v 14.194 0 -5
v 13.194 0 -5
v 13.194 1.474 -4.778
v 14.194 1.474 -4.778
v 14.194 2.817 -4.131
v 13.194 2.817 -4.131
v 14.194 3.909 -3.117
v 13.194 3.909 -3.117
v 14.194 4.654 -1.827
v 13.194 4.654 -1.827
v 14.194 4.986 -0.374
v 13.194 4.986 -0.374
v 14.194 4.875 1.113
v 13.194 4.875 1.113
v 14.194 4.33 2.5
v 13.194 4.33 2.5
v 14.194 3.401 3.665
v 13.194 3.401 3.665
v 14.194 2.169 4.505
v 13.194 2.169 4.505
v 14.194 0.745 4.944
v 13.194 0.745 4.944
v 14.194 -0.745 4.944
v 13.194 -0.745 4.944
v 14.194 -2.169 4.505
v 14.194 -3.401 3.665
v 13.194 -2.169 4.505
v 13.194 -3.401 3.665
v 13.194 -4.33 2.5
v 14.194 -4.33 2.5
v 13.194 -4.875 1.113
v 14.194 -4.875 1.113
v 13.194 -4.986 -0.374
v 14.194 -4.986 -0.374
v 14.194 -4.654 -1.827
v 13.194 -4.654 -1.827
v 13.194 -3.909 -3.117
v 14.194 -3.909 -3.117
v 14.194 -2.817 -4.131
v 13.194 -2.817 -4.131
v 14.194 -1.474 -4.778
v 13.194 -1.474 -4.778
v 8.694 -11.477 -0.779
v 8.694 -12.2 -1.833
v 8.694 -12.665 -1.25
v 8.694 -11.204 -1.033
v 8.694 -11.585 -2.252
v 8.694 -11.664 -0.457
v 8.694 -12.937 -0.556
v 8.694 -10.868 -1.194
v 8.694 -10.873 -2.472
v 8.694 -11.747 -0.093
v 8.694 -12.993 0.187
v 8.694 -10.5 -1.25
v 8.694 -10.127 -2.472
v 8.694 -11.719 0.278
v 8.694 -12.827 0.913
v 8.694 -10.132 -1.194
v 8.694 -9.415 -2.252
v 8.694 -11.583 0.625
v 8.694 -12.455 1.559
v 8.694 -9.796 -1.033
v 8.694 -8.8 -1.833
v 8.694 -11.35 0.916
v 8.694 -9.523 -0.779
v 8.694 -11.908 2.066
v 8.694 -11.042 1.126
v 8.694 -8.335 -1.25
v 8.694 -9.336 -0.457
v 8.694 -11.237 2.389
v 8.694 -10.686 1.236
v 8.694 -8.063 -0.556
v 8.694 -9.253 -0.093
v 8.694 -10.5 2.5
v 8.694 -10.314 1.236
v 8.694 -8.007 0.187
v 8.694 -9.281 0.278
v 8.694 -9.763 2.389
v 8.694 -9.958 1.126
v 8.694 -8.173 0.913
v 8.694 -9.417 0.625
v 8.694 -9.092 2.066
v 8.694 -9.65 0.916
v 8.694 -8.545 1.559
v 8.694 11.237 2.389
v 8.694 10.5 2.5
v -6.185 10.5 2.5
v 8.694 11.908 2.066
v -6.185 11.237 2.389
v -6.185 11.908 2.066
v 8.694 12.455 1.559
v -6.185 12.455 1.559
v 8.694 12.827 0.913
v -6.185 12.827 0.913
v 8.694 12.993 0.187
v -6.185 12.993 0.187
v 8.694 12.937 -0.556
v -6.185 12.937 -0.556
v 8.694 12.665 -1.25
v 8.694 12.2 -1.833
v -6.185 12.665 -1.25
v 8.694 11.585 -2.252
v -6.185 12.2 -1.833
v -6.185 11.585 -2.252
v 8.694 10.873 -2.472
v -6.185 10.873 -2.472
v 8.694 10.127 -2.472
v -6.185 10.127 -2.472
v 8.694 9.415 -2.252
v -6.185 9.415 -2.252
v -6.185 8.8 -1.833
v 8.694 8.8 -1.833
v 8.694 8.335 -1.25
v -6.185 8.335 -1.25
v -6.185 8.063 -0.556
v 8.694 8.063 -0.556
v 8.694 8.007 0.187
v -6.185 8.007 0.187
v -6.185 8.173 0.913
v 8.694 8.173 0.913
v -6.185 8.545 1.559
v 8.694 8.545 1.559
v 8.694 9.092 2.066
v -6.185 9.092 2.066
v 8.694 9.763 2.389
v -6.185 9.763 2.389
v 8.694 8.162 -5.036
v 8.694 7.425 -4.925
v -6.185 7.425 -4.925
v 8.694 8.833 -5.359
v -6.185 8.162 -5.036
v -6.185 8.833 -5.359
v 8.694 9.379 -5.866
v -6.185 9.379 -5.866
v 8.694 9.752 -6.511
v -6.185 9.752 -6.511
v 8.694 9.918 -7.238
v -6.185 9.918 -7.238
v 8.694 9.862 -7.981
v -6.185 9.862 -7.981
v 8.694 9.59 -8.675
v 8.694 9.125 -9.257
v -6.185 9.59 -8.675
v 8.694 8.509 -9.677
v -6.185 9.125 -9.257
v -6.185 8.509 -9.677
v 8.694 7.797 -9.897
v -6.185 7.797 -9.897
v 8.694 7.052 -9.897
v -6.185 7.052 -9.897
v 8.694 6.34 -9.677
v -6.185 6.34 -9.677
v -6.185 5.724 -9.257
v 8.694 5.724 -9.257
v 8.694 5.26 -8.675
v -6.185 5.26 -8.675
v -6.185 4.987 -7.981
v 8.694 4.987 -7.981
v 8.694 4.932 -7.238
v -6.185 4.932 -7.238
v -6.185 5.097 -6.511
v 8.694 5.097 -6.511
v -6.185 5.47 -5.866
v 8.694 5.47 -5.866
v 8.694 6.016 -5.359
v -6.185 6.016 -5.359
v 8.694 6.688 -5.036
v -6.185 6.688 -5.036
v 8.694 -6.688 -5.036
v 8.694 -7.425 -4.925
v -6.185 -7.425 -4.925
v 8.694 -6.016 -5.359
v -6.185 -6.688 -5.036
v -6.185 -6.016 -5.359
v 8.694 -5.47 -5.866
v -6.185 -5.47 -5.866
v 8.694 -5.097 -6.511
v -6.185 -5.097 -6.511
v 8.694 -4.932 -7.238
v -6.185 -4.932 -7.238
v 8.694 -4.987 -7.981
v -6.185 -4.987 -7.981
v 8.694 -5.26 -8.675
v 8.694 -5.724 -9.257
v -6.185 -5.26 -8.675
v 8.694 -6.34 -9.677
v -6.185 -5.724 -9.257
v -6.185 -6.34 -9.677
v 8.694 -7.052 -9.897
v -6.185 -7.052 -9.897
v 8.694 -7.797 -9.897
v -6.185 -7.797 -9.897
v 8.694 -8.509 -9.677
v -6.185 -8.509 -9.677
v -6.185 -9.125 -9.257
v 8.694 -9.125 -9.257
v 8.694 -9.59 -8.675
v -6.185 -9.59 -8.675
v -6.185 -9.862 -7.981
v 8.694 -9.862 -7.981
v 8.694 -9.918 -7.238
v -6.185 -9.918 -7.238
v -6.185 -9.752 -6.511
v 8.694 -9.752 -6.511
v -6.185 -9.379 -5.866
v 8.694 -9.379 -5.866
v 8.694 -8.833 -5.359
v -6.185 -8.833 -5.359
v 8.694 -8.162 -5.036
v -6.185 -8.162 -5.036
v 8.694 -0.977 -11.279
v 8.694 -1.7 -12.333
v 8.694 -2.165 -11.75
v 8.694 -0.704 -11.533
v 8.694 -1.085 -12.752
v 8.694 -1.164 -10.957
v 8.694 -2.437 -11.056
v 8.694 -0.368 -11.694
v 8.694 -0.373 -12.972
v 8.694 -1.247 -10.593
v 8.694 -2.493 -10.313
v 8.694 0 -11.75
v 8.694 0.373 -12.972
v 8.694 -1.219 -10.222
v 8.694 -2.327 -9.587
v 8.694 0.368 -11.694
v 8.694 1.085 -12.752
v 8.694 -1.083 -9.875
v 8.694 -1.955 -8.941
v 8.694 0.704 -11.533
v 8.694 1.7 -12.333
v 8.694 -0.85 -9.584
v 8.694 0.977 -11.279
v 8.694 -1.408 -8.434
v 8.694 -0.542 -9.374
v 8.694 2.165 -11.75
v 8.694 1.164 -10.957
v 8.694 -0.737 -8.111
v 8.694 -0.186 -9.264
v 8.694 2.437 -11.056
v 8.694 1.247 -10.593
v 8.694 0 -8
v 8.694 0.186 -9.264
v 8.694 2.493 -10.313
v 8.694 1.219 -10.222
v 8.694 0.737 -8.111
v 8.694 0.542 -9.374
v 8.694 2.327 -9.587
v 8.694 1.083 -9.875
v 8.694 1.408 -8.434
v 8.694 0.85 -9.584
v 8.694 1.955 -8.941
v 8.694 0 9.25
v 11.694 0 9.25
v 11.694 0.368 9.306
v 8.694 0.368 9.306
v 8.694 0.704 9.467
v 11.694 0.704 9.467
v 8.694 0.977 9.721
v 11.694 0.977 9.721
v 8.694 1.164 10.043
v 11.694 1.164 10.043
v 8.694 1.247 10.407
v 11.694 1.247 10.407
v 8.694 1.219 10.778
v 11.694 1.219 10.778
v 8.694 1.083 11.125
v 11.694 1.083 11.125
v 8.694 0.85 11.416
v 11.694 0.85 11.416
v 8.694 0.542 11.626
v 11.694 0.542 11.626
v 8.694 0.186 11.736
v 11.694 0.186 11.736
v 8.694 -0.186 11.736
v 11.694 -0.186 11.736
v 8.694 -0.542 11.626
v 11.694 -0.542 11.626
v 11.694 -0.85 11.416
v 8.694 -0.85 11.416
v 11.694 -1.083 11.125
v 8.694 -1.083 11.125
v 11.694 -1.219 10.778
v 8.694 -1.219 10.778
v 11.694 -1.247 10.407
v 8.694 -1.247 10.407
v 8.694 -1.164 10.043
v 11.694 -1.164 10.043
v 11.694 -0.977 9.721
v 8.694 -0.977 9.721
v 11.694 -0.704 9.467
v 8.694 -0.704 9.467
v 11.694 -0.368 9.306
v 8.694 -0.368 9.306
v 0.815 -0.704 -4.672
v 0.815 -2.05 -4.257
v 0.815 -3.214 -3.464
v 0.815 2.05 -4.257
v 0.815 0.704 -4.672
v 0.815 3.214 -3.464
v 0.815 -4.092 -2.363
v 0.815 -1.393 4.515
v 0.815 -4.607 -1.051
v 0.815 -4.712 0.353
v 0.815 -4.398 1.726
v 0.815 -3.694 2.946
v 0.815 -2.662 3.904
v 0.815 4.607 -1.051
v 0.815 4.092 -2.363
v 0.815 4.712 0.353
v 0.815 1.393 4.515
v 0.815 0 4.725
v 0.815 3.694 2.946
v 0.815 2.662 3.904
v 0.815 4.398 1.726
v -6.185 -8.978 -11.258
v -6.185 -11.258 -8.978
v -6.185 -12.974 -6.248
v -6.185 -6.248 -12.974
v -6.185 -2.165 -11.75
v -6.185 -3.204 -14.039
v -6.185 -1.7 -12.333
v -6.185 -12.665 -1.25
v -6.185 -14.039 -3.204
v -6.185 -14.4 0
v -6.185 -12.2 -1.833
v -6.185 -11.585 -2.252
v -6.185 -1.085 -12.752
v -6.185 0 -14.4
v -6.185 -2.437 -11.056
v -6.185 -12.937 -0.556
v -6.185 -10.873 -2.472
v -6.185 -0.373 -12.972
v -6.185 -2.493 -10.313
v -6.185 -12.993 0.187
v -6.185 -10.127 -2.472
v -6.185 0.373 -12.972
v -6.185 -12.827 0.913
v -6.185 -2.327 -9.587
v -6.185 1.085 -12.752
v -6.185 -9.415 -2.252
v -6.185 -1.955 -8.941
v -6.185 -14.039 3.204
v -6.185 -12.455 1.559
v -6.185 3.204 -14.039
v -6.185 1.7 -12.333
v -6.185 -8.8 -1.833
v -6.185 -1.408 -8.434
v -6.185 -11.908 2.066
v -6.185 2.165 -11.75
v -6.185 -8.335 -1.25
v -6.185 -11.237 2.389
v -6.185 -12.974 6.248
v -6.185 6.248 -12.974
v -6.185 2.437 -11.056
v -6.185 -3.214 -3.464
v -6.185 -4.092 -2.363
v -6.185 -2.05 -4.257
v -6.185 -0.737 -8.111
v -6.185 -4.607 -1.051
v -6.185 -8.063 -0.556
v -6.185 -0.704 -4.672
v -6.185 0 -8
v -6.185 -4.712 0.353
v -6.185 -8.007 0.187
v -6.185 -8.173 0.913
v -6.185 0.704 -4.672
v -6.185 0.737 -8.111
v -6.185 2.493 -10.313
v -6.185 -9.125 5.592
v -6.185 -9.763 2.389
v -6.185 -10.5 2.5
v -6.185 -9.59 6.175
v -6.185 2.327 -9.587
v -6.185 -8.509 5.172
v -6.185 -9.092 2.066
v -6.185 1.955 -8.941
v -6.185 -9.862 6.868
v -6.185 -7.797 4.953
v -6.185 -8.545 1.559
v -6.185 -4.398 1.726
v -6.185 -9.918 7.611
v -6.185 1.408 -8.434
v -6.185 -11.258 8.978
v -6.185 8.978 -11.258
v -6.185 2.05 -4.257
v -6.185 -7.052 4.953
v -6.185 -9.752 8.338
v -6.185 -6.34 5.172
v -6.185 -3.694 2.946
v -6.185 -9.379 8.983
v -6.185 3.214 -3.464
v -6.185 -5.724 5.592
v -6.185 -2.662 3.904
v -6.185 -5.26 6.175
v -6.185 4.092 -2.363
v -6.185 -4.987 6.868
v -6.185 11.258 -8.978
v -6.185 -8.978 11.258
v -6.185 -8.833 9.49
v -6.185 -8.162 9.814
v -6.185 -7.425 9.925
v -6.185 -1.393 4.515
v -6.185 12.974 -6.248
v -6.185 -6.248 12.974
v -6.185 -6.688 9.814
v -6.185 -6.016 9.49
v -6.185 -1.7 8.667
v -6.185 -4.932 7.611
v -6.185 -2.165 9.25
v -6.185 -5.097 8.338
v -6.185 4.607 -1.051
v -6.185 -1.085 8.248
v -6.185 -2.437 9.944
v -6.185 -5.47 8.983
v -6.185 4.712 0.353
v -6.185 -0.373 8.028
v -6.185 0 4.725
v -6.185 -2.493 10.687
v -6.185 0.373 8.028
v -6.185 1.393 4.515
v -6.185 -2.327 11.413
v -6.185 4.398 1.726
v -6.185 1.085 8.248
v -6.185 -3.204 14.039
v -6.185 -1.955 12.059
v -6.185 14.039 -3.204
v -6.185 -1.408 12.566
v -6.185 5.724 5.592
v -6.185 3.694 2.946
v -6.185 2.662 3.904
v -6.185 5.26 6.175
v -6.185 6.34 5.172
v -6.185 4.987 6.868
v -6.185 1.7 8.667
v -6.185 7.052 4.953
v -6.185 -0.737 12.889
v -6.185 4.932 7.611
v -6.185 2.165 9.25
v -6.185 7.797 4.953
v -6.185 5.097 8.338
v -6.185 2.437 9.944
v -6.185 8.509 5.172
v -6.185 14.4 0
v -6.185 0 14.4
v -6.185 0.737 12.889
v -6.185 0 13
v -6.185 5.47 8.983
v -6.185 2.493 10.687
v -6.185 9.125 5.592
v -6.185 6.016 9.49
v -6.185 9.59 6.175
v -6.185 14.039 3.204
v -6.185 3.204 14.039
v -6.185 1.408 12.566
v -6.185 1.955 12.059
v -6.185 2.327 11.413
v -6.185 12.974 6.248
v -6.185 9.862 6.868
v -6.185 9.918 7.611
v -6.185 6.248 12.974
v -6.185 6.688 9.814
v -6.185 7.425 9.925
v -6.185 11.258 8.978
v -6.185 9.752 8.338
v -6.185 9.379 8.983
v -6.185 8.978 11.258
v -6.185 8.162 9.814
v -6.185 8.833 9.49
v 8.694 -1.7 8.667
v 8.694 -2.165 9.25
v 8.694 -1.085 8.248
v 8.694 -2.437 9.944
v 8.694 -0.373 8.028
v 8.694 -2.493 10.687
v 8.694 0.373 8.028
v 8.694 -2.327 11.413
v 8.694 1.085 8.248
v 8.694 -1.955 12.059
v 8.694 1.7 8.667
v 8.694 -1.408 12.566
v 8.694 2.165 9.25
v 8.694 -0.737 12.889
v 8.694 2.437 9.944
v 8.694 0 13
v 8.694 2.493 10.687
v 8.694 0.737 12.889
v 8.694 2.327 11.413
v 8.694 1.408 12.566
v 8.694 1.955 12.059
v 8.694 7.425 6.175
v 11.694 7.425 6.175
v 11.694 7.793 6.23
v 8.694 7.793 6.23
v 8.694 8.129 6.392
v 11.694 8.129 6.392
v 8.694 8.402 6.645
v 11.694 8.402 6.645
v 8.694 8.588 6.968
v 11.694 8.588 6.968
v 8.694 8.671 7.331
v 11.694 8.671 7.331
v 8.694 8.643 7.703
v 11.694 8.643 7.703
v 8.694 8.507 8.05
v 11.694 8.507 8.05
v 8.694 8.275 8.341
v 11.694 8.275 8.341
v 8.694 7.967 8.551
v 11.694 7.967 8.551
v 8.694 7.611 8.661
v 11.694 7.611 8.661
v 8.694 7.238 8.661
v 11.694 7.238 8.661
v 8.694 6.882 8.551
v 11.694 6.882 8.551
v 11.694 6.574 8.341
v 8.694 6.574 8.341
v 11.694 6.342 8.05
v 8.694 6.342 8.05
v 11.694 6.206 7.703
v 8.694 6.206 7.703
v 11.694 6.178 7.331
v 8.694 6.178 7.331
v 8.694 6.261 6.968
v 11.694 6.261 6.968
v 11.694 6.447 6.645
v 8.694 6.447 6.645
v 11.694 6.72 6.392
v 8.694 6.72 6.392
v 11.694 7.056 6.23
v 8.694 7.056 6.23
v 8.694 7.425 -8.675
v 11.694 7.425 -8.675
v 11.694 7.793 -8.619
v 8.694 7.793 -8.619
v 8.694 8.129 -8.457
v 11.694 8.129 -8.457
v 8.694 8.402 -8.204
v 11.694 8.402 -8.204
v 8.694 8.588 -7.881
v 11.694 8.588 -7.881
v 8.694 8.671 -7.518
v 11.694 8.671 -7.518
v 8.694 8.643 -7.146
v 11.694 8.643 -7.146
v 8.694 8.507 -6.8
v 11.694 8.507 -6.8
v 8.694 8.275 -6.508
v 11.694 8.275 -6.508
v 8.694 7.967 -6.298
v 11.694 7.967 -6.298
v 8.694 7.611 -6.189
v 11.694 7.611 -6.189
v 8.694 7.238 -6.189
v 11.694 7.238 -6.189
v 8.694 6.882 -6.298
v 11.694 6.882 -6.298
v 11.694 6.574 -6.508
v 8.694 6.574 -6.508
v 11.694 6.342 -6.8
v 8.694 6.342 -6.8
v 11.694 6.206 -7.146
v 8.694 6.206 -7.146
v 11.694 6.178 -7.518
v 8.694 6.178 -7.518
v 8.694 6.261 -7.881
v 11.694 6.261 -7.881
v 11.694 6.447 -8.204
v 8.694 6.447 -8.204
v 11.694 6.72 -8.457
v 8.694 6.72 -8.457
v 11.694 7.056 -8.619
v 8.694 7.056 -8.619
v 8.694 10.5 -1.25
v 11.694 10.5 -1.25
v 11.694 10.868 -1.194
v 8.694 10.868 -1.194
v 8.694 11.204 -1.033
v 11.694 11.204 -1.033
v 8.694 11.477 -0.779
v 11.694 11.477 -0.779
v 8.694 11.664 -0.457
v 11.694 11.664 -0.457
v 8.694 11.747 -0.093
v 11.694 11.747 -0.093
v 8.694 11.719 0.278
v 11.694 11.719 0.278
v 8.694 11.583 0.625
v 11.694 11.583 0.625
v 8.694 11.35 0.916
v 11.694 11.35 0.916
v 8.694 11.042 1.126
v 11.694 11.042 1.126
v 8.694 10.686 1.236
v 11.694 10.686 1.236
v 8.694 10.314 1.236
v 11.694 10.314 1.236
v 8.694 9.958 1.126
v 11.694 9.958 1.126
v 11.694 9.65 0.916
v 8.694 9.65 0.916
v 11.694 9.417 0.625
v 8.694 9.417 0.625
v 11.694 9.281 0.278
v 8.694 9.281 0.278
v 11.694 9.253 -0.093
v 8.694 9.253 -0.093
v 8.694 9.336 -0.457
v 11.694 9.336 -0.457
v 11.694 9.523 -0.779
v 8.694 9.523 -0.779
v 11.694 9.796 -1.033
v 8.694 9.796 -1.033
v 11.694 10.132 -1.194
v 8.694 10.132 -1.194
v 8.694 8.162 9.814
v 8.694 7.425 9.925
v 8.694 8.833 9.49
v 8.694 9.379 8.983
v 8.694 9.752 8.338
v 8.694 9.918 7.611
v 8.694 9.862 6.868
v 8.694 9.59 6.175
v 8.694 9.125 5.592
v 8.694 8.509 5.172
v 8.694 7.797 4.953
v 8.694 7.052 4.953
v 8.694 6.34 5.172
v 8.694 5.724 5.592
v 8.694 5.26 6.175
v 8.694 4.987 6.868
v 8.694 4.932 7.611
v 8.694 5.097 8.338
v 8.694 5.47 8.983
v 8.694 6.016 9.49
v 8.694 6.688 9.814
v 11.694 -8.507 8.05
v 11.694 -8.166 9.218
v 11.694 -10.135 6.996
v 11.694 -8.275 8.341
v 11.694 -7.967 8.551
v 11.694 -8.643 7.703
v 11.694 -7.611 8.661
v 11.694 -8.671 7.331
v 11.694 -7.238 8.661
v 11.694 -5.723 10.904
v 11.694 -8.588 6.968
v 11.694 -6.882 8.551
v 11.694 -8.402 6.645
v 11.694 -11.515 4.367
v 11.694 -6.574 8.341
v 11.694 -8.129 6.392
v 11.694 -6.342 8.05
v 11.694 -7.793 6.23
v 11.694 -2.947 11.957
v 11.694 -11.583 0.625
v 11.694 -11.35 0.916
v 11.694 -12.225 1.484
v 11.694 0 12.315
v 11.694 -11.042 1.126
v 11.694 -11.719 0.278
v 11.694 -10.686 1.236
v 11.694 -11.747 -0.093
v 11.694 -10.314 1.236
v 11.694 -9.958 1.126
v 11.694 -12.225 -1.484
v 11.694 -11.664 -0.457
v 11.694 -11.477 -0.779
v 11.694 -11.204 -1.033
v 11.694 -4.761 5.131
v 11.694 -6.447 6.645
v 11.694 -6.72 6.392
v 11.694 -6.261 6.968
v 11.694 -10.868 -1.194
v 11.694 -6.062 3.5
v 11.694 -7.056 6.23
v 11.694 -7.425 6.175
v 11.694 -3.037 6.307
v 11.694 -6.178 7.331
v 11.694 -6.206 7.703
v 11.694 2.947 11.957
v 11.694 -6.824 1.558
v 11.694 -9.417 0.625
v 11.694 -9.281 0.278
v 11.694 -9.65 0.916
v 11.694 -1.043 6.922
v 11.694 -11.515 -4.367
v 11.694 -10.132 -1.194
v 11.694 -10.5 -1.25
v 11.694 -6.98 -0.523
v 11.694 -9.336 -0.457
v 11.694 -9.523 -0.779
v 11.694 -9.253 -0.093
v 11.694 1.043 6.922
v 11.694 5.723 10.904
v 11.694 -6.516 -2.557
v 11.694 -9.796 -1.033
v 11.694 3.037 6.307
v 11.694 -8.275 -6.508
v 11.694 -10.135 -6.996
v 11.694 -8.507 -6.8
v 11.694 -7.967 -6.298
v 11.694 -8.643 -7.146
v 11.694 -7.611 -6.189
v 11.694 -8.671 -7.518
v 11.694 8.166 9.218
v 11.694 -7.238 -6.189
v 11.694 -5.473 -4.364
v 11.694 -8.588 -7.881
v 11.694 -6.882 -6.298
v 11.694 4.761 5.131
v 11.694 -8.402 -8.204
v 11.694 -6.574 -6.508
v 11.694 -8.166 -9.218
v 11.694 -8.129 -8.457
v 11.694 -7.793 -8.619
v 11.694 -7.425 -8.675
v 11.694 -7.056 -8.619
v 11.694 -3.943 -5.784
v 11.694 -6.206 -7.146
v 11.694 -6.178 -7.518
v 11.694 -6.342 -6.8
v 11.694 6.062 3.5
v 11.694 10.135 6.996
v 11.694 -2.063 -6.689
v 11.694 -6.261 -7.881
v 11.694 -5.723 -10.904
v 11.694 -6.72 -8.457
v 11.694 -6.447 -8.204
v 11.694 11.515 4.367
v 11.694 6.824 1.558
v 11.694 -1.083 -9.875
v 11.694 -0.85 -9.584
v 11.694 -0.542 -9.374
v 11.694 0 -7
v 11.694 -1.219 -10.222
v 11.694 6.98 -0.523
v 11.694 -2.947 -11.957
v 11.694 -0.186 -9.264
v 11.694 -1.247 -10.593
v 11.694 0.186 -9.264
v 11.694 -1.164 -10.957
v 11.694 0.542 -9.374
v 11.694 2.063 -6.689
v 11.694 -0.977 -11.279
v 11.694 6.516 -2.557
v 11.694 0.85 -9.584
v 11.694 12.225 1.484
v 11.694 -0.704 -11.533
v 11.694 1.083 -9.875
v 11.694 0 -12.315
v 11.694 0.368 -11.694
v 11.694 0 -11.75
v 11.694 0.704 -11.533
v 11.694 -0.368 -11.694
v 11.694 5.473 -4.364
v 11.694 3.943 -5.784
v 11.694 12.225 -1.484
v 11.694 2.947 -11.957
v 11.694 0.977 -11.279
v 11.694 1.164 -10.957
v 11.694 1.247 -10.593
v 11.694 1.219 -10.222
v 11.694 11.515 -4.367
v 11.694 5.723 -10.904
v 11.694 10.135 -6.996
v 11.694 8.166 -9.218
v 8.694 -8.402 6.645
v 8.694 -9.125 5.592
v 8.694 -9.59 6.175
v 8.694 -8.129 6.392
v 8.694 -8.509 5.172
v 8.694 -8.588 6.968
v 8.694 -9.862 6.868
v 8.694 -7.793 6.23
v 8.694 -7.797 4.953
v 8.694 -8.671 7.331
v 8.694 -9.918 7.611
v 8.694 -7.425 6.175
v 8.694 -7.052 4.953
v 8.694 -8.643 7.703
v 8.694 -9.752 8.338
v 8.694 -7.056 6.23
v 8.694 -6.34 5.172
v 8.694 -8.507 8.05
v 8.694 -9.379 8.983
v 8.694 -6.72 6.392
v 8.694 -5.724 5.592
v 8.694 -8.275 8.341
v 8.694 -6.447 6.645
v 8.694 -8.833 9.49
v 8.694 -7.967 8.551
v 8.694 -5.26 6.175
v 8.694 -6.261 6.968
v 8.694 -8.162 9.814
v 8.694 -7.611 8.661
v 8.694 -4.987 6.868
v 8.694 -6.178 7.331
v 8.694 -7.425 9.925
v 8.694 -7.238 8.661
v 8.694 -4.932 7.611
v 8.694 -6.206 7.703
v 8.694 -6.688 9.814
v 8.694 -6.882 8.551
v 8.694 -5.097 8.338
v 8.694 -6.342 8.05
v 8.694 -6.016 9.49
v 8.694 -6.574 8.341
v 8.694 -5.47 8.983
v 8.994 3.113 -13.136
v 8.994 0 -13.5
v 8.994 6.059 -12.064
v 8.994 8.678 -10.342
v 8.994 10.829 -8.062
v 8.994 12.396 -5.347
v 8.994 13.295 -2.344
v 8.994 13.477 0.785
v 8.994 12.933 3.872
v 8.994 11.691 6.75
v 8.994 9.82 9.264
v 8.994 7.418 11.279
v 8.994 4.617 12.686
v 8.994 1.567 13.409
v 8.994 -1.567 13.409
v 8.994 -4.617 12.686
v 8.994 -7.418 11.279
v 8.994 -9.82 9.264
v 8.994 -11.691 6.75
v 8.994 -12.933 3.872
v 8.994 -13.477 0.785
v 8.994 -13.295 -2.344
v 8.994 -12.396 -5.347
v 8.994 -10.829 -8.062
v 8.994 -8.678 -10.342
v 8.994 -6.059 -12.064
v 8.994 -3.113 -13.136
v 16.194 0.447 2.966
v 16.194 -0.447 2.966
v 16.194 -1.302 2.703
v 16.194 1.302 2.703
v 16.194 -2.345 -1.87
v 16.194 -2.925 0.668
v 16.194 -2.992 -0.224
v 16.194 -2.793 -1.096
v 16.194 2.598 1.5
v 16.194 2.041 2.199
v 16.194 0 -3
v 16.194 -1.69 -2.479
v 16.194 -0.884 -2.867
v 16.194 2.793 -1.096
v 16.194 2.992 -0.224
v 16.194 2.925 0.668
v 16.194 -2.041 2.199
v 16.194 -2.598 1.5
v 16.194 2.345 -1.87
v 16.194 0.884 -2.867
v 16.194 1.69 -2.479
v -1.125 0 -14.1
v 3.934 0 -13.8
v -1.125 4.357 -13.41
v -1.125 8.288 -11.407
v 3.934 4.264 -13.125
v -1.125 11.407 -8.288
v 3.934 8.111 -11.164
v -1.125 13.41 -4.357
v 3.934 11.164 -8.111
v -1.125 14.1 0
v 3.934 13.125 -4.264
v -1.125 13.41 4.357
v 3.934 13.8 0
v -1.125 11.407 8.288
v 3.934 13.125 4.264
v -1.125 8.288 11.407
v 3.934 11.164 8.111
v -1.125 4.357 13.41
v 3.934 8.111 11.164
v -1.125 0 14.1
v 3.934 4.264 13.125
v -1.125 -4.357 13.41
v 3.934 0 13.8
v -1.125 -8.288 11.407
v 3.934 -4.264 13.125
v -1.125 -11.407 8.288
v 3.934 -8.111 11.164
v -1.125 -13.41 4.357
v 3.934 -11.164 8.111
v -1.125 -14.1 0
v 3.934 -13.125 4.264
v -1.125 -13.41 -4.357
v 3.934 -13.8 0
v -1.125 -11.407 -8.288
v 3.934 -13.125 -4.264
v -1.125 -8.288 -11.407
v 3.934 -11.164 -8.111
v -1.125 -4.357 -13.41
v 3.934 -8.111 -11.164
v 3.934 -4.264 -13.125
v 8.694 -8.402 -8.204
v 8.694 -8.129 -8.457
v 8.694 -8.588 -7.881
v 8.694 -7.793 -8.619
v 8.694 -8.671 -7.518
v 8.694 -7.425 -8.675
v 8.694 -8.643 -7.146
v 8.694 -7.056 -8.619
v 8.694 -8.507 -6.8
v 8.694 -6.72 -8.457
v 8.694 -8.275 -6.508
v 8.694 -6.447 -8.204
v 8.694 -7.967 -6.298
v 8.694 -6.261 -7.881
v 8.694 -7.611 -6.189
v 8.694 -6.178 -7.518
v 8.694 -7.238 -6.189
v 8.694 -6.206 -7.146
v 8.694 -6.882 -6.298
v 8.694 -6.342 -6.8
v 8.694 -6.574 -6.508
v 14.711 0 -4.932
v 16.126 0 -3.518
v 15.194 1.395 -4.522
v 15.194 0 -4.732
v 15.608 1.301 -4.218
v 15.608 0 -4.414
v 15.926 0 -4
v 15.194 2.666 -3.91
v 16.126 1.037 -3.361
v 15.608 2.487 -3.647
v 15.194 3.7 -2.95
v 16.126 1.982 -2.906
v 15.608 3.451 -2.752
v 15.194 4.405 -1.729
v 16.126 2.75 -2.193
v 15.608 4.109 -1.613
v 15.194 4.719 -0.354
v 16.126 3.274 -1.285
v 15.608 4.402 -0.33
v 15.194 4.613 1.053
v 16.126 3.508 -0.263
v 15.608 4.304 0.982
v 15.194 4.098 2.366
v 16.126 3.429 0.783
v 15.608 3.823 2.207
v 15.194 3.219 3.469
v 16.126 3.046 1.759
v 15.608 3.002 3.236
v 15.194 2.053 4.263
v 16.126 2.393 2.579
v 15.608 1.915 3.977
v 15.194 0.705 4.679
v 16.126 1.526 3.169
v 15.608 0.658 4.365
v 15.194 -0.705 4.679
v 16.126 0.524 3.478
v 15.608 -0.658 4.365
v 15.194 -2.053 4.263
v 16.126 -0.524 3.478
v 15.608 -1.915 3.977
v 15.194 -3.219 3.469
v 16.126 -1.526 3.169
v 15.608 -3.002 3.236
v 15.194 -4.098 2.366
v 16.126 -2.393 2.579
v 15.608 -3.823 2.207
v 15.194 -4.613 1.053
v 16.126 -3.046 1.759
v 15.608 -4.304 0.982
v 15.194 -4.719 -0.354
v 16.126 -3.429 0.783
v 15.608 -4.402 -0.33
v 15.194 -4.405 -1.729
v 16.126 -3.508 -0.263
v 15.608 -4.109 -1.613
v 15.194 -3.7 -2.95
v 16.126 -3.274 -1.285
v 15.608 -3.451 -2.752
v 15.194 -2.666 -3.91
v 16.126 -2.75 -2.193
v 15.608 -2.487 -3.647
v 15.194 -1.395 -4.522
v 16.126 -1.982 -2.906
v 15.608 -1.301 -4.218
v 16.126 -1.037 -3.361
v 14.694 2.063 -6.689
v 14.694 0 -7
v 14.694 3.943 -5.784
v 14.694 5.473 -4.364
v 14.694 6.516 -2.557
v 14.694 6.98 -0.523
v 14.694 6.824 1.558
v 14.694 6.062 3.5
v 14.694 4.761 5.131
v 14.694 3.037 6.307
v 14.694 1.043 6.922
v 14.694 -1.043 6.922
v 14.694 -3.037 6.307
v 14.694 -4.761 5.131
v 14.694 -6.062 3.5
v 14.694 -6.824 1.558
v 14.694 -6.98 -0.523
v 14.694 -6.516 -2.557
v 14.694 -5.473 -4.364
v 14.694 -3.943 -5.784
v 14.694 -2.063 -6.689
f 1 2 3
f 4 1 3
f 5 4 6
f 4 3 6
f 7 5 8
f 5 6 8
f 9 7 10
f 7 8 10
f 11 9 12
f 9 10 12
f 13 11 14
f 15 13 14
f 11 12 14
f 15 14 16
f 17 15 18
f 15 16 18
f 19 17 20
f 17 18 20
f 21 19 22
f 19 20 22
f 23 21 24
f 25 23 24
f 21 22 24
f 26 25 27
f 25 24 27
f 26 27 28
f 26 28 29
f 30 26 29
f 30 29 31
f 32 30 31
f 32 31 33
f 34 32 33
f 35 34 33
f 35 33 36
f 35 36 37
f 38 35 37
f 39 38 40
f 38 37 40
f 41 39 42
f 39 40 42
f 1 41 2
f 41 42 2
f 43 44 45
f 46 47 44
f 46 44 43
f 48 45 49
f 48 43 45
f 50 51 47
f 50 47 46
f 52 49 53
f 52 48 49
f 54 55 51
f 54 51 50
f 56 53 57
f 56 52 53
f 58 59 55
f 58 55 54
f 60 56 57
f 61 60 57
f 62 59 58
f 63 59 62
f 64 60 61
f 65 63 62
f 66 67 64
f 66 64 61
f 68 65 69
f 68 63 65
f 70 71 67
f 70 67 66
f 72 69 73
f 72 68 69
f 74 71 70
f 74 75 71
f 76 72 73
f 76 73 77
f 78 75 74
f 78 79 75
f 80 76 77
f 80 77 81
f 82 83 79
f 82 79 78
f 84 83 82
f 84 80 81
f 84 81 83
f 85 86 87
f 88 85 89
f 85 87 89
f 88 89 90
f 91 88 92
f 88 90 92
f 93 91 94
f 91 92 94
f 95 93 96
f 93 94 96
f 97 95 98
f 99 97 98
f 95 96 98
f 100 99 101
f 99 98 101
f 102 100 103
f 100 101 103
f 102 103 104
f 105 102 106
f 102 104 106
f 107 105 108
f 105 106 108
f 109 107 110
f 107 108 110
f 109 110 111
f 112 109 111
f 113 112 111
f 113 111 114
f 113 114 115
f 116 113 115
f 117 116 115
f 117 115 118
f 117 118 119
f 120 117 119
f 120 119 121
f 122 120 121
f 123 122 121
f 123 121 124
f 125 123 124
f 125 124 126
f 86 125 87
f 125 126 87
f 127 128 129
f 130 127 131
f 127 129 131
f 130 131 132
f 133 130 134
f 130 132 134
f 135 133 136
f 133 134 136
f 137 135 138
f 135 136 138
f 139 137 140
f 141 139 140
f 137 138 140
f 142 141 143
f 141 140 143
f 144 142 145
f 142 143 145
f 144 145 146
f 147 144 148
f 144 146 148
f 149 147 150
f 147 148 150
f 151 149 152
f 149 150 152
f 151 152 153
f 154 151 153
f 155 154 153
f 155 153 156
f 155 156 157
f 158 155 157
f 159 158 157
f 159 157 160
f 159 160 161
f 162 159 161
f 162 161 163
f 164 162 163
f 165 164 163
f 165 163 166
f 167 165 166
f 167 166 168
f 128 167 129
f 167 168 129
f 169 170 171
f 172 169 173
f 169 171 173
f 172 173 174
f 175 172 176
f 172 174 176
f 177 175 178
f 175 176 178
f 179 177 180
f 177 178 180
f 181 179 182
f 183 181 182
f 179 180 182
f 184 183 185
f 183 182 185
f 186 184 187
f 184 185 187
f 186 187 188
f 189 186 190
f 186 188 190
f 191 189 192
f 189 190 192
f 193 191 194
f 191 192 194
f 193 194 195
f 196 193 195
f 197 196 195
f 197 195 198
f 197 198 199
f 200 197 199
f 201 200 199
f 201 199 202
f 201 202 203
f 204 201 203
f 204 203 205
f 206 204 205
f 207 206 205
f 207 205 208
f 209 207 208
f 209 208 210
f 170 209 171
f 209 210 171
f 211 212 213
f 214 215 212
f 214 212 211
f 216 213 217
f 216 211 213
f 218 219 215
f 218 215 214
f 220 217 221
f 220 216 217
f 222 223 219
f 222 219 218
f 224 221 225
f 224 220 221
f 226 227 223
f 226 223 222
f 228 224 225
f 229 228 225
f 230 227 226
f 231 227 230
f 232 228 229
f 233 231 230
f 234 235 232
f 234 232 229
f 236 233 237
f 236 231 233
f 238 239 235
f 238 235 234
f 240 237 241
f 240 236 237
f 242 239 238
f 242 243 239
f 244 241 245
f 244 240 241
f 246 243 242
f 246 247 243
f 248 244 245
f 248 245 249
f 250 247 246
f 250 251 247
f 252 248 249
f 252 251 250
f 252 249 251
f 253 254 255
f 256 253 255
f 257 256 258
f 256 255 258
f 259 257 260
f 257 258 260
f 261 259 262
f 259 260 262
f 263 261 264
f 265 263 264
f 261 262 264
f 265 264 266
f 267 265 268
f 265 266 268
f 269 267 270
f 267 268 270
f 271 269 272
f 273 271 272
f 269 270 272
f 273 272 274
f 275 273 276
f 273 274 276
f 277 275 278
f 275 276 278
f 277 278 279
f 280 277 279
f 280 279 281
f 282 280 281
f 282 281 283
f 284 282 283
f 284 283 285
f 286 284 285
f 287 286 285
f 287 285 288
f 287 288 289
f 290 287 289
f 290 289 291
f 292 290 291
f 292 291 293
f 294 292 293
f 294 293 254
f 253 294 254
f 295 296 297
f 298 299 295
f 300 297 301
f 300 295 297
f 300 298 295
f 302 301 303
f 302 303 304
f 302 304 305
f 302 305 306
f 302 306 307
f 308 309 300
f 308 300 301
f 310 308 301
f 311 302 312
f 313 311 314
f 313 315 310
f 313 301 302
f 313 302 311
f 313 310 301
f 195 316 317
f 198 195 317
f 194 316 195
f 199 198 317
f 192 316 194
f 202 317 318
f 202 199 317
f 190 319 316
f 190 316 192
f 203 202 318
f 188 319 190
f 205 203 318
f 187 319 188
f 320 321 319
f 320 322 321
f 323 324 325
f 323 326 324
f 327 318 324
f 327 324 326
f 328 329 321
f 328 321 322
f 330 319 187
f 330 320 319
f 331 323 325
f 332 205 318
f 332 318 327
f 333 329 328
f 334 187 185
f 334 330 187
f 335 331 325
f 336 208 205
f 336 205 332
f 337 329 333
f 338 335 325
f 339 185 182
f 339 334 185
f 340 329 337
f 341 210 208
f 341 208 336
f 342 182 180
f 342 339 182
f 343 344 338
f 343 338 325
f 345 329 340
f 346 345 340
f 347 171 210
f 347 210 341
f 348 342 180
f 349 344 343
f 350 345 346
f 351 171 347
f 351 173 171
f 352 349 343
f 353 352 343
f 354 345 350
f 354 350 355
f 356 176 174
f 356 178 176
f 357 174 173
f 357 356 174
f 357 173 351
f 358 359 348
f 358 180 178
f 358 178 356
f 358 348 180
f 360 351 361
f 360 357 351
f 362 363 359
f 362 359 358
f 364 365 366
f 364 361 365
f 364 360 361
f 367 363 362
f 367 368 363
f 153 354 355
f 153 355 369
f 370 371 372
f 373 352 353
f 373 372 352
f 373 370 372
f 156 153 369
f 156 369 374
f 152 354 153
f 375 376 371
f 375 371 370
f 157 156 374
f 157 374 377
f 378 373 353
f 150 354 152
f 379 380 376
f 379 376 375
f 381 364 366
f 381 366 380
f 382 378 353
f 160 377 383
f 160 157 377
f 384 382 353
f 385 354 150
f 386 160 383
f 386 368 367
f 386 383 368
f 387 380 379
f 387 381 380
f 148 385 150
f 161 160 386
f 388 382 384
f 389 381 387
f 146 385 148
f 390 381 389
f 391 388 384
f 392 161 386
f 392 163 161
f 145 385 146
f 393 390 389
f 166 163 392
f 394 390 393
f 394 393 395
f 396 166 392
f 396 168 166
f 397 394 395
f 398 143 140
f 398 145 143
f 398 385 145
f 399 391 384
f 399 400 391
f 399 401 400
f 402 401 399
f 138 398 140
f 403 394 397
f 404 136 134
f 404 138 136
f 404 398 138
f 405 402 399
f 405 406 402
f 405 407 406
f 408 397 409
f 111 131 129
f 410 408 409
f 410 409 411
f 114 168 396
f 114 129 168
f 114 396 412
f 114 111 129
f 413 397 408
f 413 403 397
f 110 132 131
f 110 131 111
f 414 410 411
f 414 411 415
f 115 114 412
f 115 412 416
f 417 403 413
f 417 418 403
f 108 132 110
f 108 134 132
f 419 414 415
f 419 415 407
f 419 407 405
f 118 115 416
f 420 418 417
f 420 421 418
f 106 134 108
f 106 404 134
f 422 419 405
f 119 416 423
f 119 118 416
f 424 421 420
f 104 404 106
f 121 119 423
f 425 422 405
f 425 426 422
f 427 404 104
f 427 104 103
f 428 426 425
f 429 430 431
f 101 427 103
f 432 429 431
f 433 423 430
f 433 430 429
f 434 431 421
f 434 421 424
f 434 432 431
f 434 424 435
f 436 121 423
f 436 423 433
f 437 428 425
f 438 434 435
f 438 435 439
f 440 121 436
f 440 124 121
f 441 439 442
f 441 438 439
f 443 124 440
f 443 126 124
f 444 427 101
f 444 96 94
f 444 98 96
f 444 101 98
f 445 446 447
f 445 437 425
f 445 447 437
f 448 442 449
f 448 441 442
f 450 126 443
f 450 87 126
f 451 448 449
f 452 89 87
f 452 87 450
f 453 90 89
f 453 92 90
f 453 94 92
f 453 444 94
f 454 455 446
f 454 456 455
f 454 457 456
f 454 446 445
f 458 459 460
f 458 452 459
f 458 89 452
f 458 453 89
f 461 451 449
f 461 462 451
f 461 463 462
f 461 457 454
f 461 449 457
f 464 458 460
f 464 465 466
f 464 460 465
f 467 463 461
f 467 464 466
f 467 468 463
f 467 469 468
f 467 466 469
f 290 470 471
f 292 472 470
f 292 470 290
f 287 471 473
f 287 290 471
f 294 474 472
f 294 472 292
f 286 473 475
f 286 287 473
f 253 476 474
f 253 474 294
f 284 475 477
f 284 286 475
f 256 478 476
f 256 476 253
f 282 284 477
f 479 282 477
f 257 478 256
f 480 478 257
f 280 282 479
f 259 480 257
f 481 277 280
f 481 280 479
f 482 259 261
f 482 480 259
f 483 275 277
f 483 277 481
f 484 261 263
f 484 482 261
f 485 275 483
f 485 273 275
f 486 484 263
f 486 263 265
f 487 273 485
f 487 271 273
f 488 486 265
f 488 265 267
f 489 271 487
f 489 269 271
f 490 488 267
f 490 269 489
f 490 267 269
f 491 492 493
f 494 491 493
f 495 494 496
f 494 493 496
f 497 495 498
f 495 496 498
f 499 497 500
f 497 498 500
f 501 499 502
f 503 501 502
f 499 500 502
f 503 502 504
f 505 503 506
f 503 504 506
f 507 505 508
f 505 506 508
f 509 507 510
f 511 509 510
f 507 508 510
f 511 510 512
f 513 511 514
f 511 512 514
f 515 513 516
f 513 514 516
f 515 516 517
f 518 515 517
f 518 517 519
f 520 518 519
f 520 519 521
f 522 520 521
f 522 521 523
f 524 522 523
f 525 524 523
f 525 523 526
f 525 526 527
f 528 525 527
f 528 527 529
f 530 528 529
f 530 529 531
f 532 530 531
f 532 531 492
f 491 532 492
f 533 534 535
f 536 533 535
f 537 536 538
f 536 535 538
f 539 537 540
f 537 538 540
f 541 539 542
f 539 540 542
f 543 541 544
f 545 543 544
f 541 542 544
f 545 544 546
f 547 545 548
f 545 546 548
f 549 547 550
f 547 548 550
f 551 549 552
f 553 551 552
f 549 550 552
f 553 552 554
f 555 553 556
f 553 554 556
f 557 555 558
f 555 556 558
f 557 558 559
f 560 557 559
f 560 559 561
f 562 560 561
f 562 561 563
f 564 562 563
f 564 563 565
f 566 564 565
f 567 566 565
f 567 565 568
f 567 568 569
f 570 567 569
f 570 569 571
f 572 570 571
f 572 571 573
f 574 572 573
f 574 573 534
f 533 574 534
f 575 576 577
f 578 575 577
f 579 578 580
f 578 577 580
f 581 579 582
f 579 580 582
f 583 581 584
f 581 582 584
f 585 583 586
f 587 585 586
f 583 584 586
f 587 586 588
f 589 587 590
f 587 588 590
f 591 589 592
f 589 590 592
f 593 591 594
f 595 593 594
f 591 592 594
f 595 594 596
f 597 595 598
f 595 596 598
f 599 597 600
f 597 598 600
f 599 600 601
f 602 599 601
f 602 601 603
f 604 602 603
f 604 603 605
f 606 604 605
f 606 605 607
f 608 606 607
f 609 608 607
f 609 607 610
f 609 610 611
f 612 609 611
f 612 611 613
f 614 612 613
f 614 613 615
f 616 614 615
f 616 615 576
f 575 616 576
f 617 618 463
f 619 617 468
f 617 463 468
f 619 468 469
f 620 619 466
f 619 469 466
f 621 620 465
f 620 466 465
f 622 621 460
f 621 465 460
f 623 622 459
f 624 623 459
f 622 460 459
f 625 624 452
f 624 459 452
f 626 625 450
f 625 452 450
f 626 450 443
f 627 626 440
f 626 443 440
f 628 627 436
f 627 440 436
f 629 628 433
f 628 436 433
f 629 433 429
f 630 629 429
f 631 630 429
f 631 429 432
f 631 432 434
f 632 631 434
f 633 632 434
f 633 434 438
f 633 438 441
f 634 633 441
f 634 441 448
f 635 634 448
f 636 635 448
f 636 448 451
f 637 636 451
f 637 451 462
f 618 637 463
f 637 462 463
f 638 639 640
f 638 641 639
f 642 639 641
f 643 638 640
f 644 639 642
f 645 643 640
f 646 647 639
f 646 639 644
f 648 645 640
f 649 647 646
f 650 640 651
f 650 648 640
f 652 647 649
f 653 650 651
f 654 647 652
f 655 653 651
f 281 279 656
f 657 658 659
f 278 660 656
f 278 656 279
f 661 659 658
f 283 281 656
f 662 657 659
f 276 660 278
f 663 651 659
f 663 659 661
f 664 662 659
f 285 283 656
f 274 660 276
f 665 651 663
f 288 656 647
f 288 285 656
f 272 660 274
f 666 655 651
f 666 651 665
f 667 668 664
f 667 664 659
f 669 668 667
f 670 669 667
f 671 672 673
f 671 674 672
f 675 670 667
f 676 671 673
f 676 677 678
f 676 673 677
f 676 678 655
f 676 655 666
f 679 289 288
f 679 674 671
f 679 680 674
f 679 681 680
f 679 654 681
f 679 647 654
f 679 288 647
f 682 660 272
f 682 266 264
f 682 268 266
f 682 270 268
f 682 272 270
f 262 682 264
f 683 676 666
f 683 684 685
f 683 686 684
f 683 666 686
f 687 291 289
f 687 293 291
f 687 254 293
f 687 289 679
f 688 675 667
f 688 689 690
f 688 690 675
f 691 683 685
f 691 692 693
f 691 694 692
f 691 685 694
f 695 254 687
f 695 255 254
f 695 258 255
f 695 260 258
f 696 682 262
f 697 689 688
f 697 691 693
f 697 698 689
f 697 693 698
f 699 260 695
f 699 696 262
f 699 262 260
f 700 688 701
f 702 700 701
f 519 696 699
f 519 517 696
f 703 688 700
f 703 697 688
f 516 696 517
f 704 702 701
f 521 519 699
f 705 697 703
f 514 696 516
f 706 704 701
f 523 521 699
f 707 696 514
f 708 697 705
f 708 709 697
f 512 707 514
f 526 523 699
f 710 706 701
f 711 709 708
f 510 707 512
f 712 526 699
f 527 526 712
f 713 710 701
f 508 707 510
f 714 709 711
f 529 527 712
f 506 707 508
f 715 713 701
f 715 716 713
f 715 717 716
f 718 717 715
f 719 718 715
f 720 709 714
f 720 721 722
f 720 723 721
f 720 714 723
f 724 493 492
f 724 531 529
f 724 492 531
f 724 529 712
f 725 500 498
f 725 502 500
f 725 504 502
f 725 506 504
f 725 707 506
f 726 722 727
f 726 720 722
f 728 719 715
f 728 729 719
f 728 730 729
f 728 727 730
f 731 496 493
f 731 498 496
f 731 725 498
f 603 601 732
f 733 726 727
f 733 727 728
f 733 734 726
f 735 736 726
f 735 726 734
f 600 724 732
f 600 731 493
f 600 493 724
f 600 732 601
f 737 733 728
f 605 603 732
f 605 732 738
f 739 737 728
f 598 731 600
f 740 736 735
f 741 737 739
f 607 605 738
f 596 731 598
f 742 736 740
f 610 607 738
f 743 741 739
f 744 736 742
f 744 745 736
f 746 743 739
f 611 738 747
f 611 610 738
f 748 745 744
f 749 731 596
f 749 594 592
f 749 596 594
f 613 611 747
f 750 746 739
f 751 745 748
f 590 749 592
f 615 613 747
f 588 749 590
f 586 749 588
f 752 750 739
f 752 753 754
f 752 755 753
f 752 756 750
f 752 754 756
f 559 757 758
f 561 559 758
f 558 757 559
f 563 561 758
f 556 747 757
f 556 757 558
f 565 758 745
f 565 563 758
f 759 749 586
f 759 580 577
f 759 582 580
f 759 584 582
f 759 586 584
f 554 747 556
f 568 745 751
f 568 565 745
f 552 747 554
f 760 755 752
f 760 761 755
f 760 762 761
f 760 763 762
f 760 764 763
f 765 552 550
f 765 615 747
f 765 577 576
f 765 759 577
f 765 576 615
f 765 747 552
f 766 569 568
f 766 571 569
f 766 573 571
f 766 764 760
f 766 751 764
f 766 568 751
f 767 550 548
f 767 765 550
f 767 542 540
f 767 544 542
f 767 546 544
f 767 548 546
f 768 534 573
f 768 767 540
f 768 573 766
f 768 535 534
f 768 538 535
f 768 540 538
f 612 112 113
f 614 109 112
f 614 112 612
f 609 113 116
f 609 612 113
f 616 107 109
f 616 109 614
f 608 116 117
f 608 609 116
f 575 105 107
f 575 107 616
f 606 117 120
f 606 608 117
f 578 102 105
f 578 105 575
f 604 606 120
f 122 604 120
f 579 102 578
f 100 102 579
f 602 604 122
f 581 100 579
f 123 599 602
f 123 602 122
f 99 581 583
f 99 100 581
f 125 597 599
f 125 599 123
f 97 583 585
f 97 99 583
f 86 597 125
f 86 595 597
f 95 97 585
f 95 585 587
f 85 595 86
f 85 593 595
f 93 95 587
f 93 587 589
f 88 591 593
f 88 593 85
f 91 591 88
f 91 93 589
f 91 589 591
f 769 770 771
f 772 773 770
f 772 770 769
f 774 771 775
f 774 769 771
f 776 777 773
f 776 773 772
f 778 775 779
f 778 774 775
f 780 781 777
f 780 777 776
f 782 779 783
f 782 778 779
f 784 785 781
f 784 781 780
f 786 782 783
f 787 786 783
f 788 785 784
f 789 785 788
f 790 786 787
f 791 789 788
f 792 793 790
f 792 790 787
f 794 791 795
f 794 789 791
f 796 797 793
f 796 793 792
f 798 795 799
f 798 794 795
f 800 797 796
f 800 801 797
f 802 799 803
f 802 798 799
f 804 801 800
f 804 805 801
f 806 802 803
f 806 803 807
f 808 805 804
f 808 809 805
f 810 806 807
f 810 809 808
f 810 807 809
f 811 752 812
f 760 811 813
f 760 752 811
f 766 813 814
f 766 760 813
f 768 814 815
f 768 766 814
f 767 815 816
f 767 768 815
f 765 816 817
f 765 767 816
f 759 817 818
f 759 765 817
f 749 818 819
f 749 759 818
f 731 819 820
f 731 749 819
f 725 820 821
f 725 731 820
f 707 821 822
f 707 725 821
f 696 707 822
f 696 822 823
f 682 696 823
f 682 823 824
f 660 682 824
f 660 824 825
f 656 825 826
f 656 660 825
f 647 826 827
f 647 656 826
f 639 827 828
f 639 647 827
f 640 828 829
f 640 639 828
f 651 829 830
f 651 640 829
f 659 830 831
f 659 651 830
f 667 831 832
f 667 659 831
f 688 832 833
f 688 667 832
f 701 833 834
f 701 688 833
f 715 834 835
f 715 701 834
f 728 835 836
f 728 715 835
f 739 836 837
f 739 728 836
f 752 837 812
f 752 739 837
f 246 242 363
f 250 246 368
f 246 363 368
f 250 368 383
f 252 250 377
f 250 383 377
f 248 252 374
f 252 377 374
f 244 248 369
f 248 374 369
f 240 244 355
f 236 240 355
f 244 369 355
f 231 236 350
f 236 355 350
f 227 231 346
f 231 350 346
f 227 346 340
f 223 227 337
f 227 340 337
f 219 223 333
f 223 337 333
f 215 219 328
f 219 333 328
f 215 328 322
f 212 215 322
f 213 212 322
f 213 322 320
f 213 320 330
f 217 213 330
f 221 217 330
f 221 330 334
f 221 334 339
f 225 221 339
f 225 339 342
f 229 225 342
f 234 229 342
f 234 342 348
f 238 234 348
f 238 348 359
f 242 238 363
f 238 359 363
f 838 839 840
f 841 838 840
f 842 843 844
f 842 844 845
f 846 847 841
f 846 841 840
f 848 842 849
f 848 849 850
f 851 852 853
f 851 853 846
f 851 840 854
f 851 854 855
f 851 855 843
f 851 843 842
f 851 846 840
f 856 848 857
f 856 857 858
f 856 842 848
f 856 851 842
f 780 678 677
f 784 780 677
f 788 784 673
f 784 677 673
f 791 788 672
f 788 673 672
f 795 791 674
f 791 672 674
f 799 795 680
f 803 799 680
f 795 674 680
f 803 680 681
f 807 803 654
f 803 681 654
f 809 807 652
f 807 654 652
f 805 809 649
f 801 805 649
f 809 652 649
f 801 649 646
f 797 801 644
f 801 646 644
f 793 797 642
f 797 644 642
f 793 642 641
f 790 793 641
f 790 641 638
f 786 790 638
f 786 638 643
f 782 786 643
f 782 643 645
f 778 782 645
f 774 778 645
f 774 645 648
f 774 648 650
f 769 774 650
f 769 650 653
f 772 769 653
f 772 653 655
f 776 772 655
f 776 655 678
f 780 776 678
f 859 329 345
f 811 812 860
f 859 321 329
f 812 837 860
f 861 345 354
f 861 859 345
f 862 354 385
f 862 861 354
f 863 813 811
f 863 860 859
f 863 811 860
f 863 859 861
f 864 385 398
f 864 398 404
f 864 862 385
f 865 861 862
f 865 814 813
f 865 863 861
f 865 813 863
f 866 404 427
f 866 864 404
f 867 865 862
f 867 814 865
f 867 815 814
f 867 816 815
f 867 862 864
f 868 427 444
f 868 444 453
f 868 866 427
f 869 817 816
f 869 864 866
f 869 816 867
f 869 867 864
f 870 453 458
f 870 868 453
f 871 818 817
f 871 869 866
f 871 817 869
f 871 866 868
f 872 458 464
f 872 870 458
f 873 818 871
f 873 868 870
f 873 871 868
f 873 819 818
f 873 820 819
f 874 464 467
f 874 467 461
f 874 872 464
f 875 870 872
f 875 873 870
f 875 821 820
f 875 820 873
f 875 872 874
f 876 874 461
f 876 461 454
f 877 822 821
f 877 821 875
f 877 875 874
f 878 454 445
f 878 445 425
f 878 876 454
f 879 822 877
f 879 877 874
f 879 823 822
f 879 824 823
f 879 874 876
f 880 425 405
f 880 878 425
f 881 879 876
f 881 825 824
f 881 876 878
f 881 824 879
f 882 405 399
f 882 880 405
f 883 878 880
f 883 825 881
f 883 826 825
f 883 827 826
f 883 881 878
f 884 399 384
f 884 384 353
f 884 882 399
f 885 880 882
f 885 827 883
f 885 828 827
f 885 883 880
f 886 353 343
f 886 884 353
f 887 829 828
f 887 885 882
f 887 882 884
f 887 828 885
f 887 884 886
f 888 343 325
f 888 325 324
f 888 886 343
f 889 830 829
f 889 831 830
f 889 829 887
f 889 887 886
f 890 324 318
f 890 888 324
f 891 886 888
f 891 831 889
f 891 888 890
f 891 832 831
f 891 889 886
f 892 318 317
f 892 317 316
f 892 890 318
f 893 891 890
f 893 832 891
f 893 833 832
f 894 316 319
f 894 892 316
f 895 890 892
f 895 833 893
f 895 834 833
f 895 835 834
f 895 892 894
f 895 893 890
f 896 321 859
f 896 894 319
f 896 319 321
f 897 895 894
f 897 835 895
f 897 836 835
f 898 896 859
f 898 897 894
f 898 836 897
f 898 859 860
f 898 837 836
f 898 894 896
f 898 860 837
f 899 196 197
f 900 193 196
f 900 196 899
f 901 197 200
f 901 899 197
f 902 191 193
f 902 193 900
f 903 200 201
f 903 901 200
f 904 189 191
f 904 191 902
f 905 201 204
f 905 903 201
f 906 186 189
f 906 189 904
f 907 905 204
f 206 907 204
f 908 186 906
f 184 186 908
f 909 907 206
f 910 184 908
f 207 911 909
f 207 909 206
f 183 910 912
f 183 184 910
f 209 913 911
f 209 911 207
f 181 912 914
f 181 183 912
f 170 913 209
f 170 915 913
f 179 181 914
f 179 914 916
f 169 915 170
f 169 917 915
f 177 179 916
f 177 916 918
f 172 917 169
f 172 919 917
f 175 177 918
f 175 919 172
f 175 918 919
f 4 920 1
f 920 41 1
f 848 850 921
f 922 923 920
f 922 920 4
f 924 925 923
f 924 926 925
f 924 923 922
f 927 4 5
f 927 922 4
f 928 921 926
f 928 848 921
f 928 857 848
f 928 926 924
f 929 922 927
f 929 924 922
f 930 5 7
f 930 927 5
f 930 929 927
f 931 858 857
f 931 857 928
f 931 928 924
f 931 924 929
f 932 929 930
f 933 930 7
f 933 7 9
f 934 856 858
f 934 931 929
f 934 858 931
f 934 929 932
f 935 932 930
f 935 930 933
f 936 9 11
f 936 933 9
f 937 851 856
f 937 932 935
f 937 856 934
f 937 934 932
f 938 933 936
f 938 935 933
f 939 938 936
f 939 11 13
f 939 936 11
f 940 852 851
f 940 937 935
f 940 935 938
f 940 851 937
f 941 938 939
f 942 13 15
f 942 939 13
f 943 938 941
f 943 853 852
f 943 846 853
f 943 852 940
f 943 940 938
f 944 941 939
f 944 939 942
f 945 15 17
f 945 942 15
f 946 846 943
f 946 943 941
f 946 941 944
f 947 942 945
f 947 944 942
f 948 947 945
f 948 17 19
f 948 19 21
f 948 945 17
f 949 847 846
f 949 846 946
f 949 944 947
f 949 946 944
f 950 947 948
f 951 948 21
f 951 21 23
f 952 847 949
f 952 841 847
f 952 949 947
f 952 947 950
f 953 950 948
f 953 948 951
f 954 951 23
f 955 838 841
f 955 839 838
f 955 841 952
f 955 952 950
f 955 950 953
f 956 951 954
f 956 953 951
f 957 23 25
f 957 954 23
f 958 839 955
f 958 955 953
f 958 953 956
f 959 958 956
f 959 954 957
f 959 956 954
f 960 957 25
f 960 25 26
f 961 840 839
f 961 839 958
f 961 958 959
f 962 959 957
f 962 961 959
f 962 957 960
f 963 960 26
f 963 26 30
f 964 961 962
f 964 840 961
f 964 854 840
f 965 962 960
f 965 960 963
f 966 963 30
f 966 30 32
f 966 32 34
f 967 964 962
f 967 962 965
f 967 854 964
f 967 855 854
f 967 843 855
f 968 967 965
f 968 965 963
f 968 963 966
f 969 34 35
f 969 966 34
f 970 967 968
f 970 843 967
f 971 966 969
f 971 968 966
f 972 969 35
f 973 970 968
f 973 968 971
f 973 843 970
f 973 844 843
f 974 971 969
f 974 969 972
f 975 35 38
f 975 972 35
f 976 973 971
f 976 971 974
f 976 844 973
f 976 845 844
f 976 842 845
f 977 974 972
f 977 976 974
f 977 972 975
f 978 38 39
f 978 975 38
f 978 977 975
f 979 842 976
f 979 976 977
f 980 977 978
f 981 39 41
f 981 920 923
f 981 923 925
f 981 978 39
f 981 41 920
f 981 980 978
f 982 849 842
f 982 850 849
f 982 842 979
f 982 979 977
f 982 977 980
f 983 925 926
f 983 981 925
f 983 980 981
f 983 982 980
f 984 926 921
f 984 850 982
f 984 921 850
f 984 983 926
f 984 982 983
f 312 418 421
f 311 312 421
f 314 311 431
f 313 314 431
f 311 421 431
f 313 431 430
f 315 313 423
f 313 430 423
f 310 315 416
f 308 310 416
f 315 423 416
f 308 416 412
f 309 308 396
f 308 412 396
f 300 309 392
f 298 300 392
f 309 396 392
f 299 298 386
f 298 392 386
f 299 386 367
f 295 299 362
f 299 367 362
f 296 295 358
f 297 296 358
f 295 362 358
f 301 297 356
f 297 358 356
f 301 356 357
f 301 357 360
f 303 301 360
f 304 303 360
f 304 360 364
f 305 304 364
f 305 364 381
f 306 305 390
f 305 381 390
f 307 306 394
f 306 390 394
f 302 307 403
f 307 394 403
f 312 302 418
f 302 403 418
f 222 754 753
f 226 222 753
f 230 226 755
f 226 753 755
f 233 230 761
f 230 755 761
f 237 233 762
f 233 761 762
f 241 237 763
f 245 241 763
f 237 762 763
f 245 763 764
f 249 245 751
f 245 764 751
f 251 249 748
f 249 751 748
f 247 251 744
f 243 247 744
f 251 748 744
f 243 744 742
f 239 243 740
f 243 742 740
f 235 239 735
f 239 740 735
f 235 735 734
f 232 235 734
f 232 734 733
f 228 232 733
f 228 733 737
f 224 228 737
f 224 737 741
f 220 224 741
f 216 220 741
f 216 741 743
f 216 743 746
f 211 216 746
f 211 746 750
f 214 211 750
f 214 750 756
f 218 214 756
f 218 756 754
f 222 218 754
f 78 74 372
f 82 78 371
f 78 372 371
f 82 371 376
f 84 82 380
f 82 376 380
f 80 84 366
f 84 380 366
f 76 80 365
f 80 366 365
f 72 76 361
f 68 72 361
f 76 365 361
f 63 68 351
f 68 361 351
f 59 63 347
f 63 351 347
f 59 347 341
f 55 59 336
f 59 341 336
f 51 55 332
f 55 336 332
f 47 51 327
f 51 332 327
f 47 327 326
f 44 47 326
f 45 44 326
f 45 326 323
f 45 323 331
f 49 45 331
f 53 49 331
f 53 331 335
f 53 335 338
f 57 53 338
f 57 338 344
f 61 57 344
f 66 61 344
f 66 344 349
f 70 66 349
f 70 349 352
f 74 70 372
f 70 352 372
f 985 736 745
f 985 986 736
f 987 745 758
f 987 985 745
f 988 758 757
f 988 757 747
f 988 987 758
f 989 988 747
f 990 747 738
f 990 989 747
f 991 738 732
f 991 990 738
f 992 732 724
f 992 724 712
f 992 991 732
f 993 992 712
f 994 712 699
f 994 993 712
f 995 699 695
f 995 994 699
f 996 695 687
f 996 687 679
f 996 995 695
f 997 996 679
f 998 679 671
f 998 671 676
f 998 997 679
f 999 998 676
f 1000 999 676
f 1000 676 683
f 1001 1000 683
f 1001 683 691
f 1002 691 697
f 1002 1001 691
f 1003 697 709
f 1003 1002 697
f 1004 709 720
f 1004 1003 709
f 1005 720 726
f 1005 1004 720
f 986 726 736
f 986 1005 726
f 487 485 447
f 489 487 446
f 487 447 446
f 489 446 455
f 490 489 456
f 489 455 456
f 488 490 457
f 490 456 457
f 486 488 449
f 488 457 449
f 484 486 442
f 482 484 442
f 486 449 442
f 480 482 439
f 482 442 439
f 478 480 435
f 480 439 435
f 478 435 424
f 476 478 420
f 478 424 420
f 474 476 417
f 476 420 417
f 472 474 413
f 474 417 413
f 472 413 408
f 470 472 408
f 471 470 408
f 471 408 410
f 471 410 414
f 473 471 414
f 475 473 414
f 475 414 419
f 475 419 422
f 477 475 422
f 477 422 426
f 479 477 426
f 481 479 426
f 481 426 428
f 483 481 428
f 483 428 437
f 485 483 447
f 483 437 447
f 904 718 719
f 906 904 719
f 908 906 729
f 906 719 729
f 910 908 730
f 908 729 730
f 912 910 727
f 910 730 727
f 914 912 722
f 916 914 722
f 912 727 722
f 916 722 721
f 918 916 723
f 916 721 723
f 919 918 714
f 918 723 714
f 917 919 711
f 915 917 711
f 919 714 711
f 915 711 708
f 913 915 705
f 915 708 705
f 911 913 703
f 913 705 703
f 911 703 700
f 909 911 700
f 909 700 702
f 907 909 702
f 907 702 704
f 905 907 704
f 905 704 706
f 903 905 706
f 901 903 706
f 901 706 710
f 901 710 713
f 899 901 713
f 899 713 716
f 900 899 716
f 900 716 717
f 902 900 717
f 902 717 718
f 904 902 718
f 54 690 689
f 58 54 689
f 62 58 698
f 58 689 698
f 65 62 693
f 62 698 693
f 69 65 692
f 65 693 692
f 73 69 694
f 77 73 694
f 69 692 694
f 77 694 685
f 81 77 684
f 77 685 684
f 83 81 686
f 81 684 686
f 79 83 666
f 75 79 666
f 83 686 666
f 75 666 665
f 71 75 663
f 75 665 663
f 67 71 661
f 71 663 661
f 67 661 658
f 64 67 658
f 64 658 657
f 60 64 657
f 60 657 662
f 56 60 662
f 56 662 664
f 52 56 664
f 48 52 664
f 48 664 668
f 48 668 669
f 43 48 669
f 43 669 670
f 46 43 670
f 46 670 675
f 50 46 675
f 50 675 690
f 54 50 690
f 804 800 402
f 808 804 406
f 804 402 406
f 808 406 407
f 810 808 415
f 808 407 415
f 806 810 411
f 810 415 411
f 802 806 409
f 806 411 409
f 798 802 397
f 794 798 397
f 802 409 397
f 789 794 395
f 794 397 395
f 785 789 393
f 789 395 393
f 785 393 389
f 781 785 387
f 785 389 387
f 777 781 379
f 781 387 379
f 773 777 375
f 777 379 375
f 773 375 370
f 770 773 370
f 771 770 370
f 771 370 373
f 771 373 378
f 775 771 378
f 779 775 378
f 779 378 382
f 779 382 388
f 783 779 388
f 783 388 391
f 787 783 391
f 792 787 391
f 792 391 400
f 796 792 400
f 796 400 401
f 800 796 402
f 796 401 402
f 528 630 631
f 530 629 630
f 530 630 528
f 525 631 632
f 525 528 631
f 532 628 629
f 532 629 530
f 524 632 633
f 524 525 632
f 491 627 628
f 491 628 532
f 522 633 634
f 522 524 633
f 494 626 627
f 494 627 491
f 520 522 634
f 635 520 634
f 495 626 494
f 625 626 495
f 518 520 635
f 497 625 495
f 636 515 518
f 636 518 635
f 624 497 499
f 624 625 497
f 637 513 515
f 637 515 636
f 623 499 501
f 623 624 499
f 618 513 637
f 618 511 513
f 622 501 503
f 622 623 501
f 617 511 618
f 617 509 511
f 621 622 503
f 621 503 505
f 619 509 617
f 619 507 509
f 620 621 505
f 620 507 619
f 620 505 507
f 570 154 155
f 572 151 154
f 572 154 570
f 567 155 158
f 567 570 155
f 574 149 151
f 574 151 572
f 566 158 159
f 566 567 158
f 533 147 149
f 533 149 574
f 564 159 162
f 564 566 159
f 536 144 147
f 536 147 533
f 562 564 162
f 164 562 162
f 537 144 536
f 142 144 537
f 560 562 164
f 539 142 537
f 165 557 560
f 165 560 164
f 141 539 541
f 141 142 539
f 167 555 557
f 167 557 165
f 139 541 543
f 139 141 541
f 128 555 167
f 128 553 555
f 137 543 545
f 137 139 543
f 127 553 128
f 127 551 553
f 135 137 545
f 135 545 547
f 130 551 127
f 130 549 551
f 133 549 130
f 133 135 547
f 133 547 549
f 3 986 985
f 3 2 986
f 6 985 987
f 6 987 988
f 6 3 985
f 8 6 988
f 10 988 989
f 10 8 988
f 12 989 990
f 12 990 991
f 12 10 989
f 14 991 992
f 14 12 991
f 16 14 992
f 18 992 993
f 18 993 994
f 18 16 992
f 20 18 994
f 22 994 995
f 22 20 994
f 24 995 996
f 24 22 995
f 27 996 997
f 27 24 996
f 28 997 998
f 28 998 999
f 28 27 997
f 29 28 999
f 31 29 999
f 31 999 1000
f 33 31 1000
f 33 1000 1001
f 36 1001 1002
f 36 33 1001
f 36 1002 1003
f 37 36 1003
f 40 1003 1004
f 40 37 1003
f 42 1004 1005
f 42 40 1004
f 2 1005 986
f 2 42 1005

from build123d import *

# Parameters (mm, degrees)
SKETCH2_R          = 4.725
CUT_EXTRUDE1_DEPTH = 7
SKETCH3_R          = 1.25
CUT_EXTRUDE2_DEPTH = 18.878835952
SKETCH4_R          = 2.5
CUT_EXTRUDE3_DEPTH = 14.878836
FILLET1_R          = 2


with BuildPart() as part:
    # Sketch1 → Revolve1 (revolve)
    with BuildSketch(Plane(origin=(0, 0, 0), x_dir=(1, 0, 0), z_dir=(0, 1, 0))):
        Polygon((11.693859716, 12.315), (11.693859716, 7), (14.693859716, 7), (13.193859716, 5), (14.693859716, 5), (16.193859716, 5), (16.193859716, 0), (-6.184976236, 0), (-6.184976236, 14.4), (8.993859716, 13.5), align=None)
    revolve(axis=Axis((-18.233766234, 0, 0), (1, 0, 0)))

    # Sketch2 → Cut-Extrude1 (cut)
    with BuildSketch(Plane.ZY.offset(6.184976236)):
        Circle(SKETCH2_R)
    extrude(amount=-CUT_EXTRUDE1_DEPTH, mode=Mode.SUBTRACT)

    # Sketch3 → Cut-Extrude2 (cut, through all)
    with BuildSketch(Plane(origin=(11.693859716, 0, 0), x_dir=(0, 0, -1), z_dir=(1, 0, 0))):
        with Locations((0, 10.5)):
            Circle(SKETCH3_R)
        with Locations((7.424621202, 7.424621202)):
            Circle(SKETCH3_R)
        with Locations((10.5, 0)):
            Circle(SKETCH3_R)
        with Locations((7.424621202, -7.424621202)):
            Circle(SKETCH3_R)
        with Locations((0, -10.5)):
            Circle(SKETCH3_R)
        with Locations((-7.424621202, -7.424621202)):
            Circle(SKETCH3_R)
        with Locations((-10.5, 0)):
            Circle(SKETCH3_R)
        with Locations((-7.424621202, 7.424621202)):
            Circle(SKETCH3_R)
    extrude(amount=-CUT_EXTRUDE2_DEPTH, mode=Mode.SUBTRACT)

    # Sketch4 → Cut-Extrude3 (cut)
    with BuildSketch(Plane.ZY.offset(6.184976236)):
        with Locations((0, 10.5)):
            Circle(SKETCH4_R)
        with Locations((7.424621202, 7.424621202)):
            Circle(SKETCH4_R)
        with Locations((10.5, 0)):
            Circle(SKETCH4_R)
        with Locations((7.424621202, -7.424621202)):
            Circle(SKETCH4_R)
        with Locations((0, -10.5)):
            Circle(SKETCH4_R)
        with Locations((-7.424621202, -7.424621202)):
            Circle(SKETCH4_R)
        with Locations((-10.5, 0)):
            Circle(SKETCH4_R)
        with Locations((-7.424621202, 7.424621202)):
            Circle(SKETCH4_R)
    extrude(amount=-CUT_EXTRUDE3_DEPTH, mode=Mode.SUBTRACT)

    # Fillet1
    fillet1_edges = [part.edges().sort_by_distance(p)[0] for p in [
        (16.193859716, 0, 5),
    ]]
    fillet(fillet1_edges, radius=FILLET1_R)


solid = part.part
